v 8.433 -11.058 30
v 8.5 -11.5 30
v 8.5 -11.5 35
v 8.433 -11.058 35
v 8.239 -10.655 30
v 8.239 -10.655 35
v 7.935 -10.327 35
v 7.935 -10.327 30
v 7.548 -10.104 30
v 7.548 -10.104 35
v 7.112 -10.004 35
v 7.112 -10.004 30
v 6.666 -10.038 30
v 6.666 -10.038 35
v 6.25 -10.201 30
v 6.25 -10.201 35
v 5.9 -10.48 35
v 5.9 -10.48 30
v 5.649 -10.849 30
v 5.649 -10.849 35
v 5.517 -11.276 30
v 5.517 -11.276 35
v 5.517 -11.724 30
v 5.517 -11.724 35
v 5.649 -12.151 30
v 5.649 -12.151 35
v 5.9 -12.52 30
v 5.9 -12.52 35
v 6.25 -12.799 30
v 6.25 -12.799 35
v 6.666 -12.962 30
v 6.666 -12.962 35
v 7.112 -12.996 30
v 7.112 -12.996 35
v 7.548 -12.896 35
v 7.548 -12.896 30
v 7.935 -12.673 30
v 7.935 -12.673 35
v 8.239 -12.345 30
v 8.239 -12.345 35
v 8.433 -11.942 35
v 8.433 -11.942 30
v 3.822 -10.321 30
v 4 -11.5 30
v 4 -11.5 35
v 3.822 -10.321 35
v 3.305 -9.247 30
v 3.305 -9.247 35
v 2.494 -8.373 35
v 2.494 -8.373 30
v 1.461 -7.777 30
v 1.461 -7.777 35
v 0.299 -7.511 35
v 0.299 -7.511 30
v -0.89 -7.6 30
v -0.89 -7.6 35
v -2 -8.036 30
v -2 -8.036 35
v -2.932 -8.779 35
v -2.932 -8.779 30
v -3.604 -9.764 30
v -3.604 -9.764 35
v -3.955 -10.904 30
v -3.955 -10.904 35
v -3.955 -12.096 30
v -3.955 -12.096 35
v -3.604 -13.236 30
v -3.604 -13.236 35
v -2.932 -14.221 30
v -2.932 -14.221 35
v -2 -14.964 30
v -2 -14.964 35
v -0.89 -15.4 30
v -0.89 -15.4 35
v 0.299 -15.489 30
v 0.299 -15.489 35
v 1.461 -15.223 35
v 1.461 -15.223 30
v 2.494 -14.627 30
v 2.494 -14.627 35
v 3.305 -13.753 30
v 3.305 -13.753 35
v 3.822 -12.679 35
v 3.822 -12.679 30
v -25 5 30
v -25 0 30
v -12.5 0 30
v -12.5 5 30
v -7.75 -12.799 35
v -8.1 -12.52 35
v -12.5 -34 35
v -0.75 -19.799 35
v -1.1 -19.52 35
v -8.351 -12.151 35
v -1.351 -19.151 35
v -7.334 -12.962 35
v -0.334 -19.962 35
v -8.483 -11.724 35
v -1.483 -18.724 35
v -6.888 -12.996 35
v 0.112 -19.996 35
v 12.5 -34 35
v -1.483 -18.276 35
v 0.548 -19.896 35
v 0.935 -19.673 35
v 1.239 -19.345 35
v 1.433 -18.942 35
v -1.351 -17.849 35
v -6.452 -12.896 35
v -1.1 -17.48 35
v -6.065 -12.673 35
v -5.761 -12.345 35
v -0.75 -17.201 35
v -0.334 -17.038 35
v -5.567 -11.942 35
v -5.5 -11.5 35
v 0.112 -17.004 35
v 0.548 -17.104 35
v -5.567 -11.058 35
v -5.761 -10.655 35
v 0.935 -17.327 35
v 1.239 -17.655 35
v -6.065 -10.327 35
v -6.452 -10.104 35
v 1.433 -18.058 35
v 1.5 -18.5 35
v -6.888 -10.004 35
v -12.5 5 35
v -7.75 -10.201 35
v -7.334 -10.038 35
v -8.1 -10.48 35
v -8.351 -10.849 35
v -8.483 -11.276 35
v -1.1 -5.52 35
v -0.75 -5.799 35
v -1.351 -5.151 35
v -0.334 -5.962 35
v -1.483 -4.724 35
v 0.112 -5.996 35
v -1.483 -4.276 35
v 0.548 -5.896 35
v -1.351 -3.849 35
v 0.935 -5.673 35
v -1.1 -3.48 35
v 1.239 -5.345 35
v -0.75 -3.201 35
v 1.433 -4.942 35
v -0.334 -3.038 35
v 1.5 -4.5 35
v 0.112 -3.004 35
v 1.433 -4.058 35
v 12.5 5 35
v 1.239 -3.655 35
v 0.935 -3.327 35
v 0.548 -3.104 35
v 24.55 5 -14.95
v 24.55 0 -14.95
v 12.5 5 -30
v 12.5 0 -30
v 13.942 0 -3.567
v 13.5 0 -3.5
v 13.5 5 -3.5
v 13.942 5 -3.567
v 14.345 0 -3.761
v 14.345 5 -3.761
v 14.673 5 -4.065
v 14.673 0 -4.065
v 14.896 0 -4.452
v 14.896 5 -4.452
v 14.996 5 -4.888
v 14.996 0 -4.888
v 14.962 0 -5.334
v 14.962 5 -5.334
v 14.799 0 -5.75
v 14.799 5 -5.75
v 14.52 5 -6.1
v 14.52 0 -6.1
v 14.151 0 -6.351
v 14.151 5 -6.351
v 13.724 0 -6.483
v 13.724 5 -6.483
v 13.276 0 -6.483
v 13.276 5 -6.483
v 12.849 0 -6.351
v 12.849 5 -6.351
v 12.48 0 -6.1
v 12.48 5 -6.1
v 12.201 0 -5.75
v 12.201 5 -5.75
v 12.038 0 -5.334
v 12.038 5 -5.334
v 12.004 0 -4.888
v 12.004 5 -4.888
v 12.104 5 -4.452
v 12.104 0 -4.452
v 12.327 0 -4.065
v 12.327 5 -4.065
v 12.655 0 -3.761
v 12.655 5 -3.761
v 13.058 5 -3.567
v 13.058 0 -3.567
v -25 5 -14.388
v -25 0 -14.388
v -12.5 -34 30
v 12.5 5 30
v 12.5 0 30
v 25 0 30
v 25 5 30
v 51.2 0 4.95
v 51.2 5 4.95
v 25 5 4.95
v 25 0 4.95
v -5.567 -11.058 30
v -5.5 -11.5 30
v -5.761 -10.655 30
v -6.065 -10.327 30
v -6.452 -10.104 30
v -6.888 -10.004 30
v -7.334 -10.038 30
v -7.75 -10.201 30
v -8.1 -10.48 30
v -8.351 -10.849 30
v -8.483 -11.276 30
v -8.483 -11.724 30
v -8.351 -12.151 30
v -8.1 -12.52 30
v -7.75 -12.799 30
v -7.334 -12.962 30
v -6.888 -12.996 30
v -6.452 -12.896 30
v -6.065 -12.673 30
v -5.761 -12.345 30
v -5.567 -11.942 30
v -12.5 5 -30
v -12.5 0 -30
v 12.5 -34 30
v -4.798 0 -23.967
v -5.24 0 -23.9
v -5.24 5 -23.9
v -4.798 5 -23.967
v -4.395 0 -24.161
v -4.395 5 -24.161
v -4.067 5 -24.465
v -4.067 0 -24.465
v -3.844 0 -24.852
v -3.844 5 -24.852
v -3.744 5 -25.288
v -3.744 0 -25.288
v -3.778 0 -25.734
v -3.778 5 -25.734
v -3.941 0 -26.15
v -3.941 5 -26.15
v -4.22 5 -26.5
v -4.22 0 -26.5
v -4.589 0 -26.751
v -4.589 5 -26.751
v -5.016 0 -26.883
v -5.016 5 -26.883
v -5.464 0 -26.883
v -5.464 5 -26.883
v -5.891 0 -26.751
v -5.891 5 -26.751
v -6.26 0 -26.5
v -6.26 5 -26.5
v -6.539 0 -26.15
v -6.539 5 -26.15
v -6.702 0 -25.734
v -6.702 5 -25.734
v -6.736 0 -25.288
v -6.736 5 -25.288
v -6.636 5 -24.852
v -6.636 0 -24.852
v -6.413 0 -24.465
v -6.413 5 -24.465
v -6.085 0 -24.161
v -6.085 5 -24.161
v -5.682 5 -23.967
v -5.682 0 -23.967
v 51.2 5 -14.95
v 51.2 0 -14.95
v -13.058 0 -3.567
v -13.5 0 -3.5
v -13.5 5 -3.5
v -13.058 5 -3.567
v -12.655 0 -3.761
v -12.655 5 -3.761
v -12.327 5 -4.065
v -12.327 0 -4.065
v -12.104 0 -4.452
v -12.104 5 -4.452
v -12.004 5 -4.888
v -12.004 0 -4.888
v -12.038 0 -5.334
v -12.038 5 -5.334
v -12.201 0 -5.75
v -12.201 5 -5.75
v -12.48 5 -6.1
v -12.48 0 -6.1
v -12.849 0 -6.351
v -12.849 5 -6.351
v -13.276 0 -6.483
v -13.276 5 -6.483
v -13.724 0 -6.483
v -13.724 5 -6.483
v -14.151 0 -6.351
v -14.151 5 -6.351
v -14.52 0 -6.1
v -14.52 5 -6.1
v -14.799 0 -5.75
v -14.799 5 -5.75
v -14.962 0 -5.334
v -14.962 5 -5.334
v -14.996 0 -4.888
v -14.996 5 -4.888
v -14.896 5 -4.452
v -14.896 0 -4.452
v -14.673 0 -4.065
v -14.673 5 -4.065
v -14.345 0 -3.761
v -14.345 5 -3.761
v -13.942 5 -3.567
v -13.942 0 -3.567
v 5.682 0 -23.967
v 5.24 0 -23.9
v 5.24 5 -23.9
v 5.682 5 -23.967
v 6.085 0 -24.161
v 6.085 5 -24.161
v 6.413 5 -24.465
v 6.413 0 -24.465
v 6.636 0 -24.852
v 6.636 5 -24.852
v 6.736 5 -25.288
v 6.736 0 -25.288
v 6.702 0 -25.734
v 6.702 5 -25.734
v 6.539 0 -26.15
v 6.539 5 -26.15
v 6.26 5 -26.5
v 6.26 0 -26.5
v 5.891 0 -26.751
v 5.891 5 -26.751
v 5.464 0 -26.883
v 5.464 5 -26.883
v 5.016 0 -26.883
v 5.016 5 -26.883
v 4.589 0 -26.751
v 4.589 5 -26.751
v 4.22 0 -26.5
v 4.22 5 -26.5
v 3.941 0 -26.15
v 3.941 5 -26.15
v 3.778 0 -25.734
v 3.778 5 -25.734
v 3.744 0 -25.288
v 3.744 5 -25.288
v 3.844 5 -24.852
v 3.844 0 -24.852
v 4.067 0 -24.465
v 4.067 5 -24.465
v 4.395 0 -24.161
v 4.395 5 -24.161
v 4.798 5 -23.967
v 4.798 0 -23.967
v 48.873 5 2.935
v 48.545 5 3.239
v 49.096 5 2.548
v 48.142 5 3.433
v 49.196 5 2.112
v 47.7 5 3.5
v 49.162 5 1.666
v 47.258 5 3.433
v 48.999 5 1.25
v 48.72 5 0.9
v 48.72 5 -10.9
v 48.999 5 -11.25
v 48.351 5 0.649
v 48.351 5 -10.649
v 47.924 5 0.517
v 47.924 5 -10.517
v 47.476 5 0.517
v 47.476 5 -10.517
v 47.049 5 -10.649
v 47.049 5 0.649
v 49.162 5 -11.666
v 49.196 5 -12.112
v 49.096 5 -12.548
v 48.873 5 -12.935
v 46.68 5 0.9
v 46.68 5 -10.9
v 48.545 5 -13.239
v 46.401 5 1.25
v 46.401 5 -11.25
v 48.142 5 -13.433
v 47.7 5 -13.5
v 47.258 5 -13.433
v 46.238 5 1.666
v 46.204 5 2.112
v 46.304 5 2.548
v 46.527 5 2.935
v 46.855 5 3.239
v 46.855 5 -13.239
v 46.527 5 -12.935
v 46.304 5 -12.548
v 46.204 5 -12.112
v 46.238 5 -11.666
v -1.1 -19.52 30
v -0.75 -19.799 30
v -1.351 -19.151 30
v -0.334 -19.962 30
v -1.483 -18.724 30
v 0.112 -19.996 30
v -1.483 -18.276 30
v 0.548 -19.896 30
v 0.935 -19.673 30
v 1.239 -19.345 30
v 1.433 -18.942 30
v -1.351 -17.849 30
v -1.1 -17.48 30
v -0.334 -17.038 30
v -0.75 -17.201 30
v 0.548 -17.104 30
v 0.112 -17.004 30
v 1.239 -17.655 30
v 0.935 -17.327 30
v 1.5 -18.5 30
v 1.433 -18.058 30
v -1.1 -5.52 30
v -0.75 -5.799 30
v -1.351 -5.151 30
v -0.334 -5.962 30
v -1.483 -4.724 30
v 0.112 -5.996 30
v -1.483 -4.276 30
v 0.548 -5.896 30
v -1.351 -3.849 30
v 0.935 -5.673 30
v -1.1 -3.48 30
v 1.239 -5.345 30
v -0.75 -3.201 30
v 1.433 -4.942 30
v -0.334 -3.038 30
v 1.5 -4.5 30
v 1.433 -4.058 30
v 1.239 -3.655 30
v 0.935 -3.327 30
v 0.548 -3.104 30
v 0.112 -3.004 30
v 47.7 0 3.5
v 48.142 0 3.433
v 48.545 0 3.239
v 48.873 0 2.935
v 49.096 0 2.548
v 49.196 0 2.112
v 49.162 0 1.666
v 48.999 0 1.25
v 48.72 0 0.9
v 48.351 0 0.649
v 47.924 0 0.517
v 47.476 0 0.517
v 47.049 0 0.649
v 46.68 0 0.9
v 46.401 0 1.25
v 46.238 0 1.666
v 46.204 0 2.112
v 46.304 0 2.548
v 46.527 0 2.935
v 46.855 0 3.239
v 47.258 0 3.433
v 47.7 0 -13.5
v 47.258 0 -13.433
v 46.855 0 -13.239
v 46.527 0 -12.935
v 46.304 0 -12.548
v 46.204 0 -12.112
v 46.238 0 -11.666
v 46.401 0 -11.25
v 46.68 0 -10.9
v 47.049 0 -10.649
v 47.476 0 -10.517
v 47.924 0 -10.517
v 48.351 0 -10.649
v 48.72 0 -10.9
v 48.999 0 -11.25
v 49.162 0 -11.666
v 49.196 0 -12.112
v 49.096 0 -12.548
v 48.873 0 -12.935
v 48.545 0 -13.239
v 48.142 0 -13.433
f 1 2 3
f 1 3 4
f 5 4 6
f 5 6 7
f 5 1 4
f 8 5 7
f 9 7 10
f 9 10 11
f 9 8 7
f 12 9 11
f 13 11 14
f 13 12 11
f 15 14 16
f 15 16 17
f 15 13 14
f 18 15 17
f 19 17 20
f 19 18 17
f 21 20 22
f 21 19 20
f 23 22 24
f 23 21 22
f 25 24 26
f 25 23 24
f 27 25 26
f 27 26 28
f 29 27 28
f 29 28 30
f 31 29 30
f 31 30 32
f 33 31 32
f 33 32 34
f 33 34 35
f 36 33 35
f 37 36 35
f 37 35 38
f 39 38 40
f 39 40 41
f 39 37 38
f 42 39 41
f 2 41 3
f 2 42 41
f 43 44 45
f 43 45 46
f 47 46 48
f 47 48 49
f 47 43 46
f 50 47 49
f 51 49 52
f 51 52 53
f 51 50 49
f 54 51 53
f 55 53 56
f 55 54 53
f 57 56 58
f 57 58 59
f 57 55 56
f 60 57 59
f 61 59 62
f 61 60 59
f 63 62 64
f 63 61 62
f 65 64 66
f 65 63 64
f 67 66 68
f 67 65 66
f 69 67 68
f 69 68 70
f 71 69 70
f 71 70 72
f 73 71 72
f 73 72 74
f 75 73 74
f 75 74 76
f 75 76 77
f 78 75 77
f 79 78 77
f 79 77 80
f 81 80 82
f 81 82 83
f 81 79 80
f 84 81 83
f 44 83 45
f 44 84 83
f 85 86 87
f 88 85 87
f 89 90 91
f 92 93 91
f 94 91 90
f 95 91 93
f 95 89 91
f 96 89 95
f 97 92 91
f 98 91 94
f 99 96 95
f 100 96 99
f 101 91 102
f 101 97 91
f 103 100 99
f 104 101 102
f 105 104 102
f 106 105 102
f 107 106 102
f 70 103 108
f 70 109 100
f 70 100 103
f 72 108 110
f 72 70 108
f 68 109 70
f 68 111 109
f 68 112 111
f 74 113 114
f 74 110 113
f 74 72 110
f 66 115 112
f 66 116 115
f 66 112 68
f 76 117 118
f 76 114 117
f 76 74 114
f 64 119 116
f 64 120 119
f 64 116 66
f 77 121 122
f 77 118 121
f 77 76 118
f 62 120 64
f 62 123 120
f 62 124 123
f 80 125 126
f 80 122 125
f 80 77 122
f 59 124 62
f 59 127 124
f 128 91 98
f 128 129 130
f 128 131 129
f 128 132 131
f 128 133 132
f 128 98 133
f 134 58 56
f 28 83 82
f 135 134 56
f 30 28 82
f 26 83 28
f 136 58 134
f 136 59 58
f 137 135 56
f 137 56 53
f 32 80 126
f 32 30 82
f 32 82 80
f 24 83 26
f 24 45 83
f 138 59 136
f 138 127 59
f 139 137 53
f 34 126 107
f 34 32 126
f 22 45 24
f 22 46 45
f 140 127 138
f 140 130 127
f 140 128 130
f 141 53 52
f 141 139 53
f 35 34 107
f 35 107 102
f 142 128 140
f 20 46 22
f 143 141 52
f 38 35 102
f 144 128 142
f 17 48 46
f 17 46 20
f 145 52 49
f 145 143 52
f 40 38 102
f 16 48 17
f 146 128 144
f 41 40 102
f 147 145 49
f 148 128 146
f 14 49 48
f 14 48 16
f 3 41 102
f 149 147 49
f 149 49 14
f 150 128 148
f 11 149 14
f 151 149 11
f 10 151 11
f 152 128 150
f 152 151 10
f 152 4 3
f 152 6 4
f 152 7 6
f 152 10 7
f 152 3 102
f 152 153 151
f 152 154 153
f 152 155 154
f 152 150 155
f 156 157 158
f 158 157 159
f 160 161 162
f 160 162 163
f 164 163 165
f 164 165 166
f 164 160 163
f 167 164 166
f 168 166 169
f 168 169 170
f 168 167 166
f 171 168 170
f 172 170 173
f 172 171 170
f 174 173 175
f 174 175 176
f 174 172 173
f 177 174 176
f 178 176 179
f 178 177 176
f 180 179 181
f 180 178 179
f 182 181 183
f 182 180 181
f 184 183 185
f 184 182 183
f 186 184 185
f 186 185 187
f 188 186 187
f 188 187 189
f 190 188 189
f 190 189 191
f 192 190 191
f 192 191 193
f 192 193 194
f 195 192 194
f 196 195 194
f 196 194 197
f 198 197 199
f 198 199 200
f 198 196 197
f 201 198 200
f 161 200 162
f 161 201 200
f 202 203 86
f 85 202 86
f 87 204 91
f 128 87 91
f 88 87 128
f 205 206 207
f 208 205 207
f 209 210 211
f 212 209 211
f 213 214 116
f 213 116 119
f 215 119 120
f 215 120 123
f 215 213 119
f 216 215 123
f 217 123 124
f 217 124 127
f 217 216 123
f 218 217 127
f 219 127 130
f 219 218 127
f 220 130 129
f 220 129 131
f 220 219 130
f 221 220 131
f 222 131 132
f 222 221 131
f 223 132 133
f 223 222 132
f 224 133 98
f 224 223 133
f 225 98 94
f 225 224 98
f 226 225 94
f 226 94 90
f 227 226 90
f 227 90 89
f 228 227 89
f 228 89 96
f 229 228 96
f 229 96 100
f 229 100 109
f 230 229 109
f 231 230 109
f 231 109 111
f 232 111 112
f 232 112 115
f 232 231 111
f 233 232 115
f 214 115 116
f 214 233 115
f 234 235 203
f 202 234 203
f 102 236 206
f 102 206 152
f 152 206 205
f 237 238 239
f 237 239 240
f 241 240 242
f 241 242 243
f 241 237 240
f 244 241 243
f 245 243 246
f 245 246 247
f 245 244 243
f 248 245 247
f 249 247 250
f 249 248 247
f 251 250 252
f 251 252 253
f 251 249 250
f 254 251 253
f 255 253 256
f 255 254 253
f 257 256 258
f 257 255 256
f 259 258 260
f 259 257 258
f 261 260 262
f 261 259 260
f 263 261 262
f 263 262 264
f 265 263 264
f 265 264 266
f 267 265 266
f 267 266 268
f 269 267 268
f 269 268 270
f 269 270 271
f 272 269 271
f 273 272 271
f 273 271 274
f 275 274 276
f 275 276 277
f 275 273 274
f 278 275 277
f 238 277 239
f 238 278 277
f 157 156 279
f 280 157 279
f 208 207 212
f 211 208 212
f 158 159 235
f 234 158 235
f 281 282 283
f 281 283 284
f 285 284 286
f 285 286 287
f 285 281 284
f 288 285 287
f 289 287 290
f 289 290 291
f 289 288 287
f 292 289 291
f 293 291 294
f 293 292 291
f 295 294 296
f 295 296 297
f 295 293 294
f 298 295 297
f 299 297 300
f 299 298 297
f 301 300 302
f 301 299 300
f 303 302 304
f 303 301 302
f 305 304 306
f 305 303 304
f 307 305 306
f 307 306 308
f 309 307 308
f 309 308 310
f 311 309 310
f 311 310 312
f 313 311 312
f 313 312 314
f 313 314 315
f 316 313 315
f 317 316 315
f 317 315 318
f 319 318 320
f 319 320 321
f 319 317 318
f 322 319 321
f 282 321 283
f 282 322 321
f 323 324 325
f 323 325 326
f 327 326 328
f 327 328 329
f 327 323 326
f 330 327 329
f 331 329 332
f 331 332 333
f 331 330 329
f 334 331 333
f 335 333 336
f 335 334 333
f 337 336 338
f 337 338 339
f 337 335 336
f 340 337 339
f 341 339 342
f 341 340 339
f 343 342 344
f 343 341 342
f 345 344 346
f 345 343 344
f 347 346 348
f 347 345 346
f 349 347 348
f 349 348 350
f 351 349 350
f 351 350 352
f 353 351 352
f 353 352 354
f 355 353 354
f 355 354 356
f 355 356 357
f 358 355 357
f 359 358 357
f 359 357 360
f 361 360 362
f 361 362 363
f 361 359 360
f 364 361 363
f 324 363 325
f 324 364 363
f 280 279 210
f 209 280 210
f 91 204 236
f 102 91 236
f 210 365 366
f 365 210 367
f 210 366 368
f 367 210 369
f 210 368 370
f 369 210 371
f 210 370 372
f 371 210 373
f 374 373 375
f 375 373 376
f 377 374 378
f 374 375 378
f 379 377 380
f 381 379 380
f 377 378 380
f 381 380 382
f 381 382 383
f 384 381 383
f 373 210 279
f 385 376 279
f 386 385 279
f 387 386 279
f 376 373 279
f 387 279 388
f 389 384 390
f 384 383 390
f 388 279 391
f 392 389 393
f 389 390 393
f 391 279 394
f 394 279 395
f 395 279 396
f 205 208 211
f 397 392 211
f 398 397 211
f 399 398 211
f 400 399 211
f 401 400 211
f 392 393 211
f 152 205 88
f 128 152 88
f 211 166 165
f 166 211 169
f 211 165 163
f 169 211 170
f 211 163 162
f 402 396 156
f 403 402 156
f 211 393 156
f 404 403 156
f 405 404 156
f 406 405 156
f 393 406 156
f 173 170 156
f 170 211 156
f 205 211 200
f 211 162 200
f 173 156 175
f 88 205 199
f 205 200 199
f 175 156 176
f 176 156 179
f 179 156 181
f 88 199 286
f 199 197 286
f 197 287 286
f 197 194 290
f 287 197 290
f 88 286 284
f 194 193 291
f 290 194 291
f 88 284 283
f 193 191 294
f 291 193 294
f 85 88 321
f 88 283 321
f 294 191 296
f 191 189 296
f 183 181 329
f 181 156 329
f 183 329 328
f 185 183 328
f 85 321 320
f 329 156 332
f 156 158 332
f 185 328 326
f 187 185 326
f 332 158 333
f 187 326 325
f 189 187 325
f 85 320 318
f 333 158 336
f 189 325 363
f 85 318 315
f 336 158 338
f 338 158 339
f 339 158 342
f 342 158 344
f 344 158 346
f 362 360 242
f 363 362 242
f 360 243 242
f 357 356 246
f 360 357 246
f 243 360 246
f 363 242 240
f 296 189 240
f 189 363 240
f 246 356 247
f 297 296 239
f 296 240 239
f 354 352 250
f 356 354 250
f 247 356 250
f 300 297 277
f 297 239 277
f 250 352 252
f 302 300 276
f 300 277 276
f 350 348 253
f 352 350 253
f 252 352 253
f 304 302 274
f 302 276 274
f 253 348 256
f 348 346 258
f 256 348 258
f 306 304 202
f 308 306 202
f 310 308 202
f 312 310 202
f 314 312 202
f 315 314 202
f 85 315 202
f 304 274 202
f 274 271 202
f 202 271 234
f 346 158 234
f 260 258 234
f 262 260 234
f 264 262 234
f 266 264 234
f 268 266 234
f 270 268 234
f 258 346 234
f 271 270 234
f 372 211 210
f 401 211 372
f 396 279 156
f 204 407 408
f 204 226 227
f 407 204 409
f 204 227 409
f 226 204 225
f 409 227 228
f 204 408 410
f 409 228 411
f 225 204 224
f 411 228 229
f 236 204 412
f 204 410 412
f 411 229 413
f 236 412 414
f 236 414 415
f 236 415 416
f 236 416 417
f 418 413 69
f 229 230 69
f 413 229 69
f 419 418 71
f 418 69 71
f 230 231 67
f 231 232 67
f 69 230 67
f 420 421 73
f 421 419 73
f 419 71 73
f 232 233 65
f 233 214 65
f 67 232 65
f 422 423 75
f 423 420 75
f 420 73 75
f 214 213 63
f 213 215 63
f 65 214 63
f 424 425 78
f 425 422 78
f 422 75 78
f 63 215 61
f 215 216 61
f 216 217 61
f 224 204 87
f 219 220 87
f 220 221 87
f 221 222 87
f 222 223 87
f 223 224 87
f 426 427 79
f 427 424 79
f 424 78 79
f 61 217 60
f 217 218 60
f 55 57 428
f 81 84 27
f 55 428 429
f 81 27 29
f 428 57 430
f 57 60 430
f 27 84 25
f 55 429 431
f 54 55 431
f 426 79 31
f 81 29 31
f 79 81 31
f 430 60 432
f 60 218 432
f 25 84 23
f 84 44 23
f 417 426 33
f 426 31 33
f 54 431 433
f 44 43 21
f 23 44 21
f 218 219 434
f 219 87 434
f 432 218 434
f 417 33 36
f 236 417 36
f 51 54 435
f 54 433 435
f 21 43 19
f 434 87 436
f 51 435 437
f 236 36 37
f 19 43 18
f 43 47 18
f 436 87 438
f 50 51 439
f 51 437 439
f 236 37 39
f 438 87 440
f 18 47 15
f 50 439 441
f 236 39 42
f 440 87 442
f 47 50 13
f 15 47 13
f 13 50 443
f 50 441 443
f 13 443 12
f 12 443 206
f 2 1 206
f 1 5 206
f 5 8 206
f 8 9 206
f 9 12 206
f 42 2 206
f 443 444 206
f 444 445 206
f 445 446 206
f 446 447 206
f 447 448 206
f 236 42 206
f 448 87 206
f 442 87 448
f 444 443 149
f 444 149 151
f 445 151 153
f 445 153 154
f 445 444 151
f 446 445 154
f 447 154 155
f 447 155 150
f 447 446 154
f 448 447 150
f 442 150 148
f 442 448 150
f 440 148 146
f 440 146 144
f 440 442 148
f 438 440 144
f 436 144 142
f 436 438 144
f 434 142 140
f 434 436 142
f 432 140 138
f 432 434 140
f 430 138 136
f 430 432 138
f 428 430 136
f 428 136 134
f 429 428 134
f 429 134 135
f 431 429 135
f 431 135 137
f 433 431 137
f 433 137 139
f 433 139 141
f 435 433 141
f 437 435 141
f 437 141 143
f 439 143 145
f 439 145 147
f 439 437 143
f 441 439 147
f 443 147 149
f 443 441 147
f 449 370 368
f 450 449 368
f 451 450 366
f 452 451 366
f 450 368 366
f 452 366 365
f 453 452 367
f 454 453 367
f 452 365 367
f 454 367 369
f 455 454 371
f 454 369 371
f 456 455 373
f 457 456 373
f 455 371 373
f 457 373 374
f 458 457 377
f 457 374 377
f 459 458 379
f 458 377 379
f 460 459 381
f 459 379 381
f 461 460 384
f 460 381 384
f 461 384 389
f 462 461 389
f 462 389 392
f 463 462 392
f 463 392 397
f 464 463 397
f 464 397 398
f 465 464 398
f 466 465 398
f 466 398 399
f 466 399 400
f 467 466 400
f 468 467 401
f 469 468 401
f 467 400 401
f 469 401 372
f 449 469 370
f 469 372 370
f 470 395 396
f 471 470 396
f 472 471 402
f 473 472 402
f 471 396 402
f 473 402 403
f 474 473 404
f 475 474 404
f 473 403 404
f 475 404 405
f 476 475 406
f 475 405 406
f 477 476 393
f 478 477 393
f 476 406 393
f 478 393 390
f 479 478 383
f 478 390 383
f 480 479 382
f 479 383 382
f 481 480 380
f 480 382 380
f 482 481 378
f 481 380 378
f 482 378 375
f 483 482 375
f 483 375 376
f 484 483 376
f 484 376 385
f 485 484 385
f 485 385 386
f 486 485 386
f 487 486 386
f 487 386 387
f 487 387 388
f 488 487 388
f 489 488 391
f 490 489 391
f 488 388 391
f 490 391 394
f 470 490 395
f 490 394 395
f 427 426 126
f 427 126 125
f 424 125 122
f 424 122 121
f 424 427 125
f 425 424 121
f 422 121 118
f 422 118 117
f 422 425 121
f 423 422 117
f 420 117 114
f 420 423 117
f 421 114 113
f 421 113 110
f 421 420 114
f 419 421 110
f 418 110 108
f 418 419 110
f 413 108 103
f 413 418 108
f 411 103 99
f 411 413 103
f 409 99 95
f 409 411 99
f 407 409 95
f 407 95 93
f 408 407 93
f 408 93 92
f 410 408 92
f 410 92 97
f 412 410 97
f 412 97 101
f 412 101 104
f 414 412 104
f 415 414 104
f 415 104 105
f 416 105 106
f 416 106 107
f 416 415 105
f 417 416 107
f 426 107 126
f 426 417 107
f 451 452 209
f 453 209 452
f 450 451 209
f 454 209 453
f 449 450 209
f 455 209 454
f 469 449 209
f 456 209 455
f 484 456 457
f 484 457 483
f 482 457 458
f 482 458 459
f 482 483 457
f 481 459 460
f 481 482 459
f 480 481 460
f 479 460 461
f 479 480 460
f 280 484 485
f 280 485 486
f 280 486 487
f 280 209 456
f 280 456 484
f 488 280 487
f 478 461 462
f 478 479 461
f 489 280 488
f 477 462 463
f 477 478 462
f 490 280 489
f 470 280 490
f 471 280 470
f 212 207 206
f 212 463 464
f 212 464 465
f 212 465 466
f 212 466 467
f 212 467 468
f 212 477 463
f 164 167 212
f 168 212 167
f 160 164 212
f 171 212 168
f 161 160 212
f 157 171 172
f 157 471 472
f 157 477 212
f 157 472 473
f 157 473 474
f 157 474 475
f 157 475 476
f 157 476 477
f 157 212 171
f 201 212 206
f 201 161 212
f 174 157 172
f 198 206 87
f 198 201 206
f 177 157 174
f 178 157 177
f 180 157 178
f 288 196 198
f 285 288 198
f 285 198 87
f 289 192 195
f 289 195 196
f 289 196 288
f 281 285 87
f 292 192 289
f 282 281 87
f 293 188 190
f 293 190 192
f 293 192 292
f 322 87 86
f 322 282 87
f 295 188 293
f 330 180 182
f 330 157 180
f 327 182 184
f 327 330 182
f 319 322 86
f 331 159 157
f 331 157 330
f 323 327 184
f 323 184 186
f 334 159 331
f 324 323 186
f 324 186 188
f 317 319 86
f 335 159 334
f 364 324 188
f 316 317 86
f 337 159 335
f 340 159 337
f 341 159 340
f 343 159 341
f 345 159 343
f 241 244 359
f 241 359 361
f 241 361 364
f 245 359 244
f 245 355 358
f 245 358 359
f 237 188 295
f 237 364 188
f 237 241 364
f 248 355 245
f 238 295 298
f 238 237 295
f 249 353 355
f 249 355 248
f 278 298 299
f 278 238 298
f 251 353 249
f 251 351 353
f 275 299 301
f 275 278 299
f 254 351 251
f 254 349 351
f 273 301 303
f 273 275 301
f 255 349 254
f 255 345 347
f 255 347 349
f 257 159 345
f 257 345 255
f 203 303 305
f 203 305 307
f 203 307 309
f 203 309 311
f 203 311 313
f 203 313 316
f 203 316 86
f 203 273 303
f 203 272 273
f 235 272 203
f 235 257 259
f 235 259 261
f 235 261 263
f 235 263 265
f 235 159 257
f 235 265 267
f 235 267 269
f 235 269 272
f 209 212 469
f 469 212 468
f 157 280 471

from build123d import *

# Parameters (mm, degrees)
SKETCH_1_R      = 1.5
EXTRUDE_1_DEPTH = 5
SKETCH_2_W      = 25
SKETCH_2_H      = 34
SKETCH_2_R      = 1.5
SKETCH_2_R_2    = 4
SKETCH_2_H_2    = 5
EXTRUDE_2_DEPTH = 5
SKETCH_3_R      = 1.5
EXTRUDE_3_DEPTH = 5


with BuildPart() as part:
    # 스케치1 → 보스-돌출1 (new body)
    with BuildSketch(Plane(origin=(0, 0, 0), x_dir=(1, 0, 0), z_dir=(0, 1, 0))):
        Polygon((12.5, 30), (-12.5, 30), (-25, 14.387505004), (-25, -30), (25, -30), (25, 14.387505004), align=None)
        with Locations(Location((-13.5, 5, 0), (0, 0, 270))):
            Circle(SKETCH_1_R, mode=Mode.SUBTRACT)
        with Locations(Location((-5.24, 25.4, 0), (0, 0, 270))):
            Circle(SKETCH_1_R, mode=Mode.SUBTRACT)
        with Locations(Location((13.5, 5, 0), (0, 0, 270))):
            Circle(SKETCH_1_R, mode=Mode.SUBTRACT)
        with Locations(Location((5.24, 25.4, 0), (0, 0, 270))):
            Circle(SKETCH_1_R, mode=Mode.SUBTRACT)
    extrude(amount=EXTRUDE_1_DEPTH)

    # 스케치2 → 보스-돌출2 (add)
    # profile 1 of 2: a face of its own
    with BuildSketch(Plane.XY.offset(30)):
        with Locations((0, -17)):
            Rectangle(SKETCH_2_W, SKETCH_2_H)
        with Locations((0, -18.5)):
            Circle(SKETCH_2_R, mode=Mode.SUBTRACT)
        with Locations((-7, -11.5)):
            Circle(SKETCH_2_R, mode=Mode.SUBTRACT)
        with Locations((0, -11.5)):
            Circle(SKETCH_2_R_2, mode=Mode.SUBTRACT)
        with Locations((7, -11.5)):
            Circle(SKETCH_2_R, mode=Mode.SUBTRACT)
        with Locations((0, -4.5)):
            Circle(SKETCH_2_R, mode=Mode.SUBTRACT)
    # profile 2 of 2: a face of its own
    with BuildSketch(Plane.XY.offset(30)):
        with Locations((0, 2.5)):
            Rectangle(SKETCH_2_W, SKETCH_2_H_2)
    extrude(amount=EXTRUDE_2_DEPTH)

    # 스케치3 → 보스-돌출3 (add)
    with BuildSketch(Plane(origin=(0, 5, 0), x_dir=(1, 0, 0), z_dir=(0, 1, 0))):
        Polygon((51.2, 14.95), (51.2, -4.95), (25, -4.95), (25, 14.387505004), (24.549643574, 14.95), align=None)
        with Locations(Location((47.7, -2, 0), (0, 0, 270))):
            Circle(SKETCH_3_R, mode=Mode.SUBTRACT)
        with Locations(Location((47.7, 12, 0), (0, 0, 90))):
            Circle(SKETCH_3_R, mode=Mode.SUBTRACT)
    extrude(amount=-EXTRUDE_3_DEPTH)


solid = part.part
